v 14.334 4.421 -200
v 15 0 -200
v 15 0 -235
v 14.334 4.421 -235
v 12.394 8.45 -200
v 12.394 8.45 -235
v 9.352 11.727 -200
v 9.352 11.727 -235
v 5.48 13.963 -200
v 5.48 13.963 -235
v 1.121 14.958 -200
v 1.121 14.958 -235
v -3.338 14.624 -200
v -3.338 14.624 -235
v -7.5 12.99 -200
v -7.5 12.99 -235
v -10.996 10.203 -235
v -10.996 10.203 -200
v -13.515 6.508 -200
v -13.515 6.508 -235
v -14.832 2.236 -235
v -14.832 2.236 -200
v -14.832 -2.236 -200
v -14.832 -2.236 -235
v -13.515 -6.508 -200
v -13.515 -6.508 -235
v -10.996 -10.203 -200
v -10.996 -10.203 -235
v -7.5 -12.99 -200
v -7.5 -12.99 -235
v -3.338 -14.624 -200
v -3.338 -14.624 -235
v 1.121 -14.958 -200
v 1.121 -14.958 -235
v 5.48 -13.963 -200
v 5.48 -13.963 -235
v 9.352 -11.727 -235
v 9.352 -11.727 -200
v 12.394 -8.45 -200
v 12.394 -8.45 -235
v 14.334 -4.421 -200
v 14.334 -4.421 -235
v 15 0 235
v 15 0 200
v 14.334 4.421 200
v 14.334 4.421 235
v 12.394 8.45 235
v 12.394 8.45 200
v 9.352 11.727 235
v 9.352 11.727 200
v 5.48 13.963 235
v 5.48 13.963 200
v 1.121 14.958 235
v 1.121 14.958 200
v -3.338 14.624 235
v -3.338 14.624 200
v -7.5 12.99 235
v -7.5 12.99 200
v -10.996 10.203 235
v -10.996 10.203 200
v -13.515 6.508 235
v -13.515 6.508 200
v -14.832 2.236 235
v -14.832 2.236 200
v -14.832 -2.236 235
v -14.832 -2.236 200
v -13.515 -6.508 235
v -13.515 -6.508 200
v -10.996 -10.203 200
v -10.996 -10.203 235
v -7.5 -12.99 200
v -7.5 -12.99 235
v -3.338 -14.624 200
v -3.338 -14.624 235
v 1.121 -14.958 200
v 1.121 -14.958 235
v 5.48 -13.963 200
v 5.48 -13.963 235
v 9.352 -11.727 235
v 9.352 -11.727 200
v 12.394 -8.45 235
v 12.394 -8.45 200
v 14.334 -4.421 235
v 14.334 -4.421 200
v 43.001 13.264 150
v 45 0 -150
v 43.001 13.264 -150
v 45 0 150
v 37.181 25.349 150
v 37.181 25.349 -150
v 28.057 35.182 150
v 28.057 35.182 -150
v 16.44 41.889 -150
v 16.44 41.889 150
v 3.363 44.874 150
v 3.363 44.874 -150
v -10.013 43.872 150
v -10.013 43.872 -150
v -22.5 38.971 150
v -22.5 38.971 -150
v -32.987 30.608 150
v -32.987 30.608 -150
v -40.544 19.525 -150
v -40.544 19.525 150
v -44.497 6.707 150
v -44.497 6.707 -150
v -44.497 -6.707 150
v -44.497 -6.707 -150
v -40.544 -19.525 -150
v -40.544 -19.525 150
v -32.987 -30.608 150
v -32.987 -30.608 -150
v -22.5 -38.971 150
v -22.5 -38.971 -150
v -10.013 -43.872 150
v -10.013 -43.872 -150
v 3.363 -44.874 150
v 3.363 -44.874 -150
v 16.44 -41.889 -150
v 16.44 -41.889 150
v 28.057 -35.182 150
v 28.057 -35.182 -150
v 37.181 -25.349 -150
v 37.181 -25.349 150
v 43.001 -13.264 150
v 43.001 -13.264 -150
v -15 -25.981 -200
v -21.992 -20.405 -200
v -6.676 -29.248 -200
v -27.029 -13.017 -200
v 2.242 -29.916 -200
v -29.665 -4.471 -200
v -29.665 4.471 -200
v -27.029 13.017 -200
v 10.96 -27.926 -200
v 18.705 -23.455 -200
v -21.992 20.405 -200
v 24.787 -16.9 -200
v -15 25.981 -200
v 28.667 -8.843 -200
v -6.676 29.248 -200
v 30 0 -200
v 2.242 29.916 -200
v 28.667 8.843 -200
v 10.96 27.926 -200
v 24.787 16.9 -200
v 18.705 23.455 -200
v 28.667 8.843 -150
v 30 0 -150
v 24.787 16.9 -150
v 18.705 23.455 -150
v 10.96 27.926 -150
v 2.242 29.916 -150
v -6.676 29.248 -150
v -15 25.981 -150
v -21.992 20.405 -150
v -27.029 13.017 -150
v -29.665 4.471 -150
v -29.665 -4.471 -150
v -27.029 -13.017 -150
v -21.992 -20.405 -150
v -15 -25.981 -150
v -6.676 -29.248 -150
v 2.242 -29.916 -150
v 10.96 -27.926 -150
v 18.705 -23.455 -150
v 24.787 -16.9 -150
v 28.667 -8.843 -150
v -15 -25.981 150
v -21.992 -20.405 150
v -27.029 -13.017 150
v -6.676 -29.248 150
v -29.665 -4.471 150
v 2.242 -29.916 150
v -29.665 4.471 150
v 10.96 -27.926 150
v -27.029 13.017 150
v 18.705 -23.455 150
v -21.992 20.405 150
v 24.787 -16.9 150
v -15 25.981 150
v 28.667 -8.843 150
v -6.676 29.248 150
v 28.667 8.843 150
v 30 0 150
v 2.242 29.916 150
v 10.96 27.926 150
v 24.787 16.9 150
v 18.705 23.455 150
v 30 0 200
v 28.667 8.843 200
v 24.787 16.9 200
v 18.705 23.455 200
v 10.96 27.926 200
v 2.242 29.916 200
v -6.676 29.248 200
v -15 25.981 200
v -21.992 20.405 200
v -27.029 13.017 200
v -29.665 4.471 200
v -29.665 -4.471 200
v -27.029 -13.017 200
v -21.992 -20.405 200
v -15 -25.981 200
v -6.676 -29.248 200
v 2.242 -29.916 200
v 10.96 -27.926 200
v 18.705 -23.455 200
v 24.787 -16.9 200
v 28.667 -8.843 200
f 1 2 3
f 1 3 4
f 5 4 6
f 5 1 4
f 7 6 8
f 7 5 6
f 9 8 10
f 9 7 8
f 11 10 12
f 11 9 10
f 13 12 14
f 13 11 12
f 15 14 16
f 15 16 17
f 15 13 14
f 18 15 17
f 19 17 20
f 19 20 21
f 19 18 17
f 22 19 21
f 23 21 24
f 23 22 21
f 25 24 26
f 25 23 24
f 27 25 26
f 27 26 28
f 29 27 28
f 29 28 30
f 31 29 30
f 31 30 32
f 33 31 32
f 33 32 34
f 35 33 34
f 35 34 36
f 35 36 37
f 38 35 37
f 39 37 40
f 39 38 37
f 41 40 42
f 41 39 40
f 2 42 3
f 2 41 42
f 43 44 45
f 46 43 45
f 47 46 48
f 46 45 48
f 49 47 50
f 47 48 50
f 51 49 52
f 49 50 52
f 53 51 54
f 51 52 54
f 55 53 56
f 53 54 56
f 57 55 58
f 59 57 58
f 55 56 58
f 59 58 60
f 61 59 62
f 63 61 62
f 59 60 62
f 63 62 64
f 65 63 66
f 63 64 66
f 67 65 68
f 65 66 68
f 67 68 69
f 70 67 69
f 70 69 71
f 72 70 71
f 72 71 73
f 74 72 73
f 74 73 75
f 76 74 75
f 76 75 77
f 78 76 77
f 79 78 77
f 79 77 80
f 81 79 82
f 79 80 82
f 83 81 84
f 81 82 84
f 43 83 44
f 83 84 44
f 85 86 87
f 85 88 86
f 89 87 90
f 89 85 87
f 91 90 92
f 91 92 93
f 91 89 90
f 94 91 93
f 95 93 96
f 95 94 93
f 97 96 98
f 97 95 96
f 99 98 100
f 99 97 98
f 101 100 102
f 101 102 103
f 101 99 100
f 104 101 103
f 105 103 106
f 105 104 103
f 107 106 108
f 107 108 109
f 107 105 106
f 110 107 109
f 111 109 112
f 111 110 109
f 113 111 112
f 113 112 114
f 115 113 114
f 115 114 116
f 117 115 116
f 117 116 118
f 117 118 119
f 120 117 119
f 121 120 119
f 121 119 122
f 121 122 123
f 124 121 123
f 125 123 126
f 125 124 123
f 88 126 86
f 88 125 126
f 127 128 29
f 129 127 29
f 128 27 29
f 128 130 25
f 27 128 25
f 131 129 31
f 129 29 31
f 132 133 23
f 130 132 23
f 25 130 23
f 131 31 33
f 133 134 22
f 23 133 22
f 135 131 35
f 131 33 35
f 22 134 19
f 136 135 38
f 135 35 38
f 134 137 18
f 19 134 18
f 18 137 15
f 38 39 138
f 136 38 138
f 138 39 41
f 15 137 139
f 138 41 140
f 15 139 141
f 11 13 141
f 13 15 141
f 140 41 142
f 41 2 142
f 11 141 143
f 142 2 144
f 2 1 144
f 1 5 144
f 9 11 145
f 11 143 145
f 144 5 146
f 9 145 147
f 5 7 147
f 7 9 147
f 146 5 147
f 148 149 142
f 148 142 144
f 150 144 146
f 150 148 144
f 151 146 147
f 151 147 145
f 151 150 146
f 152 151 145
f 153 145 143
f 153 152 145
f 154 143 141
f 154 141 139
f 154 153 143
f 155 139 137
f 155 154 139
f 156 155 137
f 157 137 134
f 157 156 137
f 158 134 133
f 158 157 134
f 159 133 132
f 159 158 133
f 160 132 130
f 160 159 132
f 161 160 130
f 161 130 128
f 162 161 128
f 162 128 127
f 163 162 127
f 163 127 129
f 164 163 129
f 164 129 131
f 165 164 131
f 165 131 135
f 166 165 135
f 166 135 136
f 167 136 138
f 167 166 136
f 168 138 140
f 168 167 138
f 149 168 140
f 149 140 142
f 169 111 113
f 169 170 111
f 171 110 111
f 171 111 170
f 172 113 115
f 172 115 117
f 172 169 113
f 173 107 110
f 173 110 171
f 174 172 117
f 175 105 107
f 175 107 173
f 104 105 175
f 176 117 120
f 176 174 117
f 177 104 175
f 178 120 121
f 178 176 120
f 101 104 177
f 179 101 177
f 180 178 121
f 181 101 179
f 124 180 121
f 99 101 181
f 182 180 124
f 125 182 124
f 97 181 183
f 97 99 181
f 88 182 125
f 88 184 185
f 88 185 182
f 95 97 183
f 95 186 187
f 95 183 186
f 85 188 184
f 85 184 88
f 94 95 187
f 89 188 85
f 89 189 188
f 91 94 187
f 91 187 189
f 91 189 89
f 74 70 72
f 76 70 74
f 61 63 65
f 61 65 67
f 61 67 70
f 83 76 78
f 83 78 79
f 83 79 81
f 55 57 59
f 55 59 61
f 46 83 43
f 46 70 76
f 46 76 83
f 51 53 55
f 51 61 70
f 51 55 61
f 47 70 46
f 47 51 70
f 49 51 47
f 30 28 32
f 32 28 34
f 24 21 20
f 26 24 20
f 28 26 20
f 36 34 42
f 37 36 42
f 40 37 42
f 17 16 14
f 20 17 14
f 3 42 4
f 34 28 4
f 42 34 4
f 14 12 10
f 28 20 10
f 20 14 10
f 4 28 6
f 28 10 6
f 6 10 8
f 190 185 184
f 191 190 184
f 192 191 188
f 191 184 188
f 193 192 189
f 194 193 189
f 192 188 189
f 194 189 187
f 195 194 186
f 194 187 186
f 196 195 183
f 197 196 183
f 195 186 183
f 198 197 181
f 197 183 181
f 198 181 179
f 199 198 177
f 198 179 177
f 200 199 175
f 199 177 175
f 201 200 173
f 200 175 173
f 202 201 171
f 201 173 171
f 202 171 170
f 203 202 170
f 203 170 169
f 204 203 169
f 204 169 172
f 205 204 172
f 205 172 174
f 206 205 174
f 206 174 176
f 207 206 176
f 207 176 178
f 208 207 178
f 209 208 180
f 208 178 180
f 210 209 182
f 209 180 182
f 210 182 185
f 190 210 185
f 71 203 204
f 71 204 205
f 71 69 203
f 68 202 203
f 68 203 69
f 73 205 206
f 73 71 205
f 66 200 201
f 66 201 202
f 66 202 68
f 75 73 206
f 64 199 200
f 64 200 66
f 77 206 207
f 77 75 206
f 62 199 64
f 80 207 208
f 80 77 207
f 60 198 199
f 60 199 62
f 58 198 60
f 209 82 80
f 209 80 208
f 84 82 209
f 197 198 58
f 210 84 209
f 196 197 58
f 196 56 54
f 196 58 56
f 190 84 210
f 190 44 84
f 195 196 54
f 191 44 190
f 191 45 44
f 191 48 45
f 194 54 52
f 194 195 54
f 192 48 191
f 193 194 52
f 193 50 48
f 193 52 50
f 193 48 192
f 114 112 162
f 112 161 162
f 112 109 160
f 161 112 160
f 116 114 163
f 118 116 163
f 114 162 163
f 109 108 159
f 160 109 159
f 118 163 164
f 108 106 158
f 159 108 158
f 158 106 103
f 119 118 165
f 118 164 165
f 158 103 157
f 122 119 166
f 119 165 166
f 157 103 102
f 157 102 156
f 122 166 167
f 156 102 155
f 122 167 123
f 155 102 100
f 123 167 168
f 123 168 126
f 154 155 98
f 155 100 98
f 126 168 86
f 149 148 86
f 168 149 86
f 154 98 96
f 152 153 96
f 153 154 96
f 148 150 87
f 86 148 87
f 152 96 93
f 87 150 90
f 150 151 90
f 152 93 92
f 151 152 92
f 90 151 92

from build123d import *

# Parameters (mm, degrees)
SKETCH1_R           = 45
BOSS_EXTRUDE1_DEPTH = 150
SKETCH2_R           = 30
BOSS_EXTRUDE2_DEPTH = 50
SKETCH3_R           = 15
BOSS_EXTRUDE3_DEPTH = 35


with BuildPart() as part:
    # Sketch1 → Boss-Extrude1 (new, symmetric)
    with BuildSketch(Plane.XY):
        Circle(SKETCH1_R)
    extrude(amount=BOSS_EXTRUDE1_DEPTH, both=True)

    # Sketch2 → Boss-Extrude2 (add)
    with BuildSketch(Plane.XY.offset(150)):
        Circle(SKETCH2_R)
    boss_extrude2 = extrude(amount=BOSS_EXTRUDE2_DEPTH)

    # Sketch3 → Boss-Extrude3 (add)
    with BuildSketch(Plane.XY.offset(200)):
        Circle(SKETCH3_R)
    boss_extrude3 = extrude(amount=BOSS_EXTRUDE3_DEPTH)

    # Mirror2: Boss-Extrude2, Boss-Extrude3 across plane
    add(boss_extrude2.mirror(Plane.XY))
    add(boss_extrude3.mirror(Plane.XY))


solid = part.part
